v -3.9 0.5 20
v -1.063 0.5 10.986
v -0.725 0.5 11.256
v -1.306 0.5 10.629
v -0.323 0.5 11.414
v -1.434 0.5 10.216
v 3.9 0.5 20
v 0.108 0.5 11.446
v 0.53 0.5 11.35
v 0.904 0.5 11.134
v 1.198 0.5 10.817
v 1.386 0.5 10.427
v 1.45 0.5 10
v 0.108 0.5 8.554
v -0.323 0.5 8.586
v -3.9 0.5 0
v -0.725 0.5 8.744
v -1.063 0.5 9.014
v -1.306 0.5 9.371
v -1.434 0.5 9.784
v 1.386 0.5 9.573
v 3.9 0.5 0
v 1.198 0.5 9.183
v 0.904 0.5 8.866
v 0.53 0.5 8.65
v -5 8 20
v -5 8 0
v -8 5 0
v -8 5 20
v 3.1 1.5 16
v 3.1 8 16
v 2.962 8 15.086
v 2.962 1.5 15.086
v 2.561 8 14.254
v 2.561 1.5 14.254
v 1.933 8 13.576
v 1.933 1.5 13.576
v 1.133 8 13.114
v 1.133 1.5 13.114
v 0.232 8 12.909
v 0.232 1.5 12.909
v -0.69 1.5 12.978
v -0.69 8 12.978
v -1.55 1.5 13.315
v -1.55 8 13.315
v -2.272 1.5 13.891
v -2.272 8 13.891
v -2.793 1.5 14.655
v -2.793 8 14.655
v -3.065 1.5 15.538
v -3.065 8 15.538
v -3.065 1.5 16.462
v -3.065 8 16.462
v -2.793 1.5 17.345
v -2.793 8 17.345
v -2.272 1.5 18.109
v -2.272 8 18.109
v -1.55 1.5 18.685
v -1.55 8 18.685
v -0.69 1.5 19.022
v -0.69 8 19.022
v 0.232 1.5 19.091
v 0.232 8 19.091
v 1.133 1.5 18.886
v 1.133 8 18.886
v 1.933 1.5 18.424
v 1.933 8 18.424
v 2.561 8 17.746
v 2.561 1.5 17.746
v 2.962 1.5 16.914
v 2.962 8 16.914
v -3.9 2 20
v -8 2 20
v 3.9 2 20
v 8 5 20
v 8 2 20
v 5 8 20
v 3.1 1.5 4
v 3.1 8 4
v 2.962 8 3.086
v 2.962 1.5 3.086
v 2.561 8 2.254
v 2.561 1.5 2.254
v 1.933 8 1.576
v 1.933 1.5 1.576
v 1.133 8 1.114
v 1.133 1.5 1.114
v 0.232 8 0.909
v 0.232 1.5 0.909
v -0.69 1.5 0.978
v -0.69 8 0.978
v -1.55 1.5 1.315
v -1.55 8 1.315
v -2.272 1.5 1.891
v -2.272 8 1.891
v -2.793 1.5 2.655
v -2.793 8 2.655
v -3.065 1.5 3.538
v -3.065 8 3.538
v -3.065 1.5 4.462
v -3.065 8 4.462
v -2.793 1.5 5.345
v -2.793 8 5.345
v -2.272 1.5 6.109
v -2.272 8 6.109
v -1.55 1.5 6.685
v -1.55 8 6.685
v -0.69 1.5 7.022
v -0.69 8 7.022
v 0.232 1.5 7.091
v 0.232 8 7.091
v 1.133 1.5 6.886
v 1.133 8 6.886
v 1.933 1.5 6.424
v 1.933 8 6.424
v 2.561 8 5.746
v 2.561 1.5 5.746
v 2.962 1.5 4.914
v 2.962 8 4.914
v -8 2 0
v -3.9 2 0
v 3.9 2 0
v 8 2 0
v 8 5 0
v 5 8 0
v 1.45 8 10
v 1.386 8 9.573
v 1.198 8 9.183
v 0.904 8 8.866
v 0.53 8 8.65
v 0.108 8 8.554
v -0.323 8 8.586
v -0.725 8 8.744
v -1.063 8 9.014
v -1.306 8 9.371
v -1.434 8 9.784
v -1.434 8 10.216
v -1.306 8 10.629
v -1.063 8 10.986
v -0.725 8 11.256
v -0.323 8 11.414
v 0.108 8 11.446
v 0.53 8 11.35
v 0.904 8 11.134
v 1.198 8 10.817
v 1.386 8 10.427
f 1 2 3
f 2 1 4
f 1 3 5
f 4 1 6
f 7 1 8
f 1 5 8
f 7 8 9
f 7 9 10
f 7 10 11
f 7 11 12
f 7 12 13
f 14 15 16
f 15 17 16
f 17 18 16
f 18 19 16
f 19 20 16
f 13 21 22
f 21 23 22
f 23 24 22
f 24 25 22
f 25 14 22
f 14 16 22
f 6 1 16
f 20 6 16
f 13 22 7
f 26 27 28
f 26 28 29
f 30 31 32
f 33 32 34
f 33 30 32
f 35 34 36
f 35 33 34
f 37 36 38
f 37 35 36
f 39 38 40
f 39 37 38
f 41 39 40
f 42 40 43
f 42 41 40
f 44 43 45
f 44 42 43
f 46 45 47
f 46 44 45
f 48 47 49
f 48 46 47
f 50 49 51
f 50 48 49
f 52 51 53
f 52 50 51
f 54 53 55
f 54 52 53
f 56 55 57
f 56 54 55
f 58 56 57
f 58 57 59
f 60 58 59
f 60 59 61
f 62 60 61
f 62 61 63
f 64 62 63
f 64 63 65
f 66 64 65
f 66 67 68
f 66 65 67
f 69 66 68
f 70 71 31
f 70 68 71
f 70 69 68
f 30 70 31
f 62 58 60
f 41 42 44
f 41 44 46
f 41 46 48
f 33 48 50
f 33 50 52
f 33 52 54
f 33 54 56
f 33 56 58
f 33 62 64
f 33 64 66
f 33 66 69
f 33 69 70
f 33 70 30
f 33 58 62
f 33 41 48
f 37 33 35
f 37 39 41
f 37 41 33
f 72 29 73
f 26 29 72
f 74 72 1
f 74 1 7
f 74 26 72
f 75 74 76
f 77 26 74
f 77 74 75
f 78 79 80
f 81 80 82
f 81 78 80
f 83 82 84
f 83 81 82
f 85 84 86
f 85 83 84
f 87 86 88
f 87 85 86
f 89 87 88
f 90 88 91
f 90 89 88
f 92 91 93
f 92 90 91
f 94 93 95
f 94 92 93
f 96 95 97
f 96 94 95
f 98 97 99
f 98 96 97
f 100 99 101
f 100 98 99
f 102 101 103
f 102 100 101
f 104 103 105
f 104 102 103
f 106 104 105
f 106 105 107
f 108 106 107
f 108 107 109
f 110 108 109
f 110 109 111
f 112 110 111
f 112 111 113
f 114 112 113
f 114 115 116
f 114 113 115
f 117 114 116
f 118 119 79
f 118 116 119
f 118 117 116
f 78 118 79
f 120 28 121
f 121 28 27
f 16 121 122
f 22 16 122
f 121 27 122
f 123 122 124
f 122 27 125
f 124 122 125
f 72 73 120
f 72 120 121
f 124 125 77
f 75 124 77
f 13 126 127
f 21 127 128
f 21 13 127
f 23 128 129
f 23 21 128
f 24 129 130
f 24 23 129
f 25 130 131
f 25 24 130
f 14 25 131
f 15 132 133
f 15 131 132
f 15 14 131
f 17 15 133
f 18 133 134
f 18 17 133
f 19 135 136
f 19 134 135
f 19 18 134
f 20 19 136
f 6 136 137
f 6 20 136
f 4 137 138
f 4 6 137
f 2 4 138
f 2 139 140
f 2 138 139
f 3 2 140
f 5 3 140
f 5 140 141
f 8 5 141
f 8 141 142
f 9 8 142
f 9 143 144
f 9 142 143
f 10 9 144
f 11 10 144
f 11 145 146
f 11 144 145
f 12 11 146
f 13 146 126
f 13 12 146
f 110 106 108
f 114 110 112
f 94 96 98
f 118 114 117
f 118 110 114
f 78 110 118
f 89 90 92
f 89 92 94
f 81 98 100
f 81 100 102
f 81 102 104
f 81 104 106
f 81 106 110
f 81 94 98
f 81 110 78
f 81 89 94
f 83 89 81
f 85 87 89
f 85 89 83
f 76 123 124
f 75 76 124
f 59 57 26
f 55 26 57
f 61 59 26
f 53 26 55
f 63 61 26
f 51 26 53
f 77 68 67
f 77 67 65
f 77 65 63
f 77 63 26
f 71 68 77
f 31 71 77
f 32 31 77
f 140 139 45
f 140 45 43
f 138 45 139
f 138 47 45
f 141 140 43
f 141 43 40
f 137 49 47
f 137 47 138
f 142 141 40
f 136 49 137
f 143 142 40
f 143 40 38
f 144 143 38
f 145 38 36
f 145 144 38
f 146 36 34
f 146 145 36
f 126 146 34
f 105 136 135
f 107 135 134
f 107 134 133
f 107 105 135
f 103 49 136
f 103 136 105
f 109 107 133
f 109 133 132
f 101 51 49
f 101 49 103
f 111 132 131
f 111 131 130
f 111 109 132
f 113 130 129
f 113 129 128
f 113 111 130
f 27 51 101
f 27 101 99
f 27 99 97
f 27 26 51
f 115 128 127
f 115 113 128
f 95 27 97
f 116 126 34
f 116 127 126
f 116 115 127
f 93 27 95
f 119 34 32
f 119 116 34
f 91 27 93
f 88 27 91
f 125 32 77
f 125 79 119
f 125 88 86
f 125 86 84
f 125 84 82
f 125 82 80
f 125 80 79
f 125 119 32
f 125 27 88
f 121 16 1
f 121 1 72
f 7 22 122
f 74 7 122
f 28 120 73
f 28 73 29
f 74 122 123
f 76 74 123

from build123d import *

# Parameters (mm, degrees)
CYLINDER016017_R            = 1.45
CYLINDER016017_DEPTH        = 10
CYLINDER016015_R            = 3.1
CYLINDER016015_DEPTH        = 10
CYLINDER016016_R            = 3.1
CYLINDER016016_DEPTH        = 10
BOX021_W                    = 7.8
BOX021_H                    = 7.5
BOX021_DEPTH                = 20
BOX022_W                    = 16
BOX022_H                    = 6
BOX022_DEPTH                = 20
CHAMFER016016008004002_SIZE = 3


with BuildPart() as cylinder033:
    # Cylinder016017 → Cylinder016017 (new body)
    with BuildSketch(Plane(origin=(0, 0.5, 10), x_dir=(1, 0, 0), z_dir=(0, 1, 0))):
        Circle(CYLINDER016017_R)
    extrude(amount=CYLINDER016017_DEPTH)


with BuildPart() as cylinder031:
    # Cylinder016015 → Cylinder016015 (new body)
    with BuildSketch(Plane(origin=(0, 0.5, 4), x_dir=(1, 0, 0), z_dir=(0, 1, 0))):
        Circle(CYLINDER016015_R)
    extrude(amount=CYLINDER016015_DEPTH)


with BuildPart() as fusion018004:
    # Cylinder016016 → Cylinder016016 (new body)
    with BuildSketch(Plane(origin=(0, 0.5, 16), x_dir=(1, 0, 0), z_dir=(0, 1, 0))):
        Circle(CYLINDER016016_R)
    extrude(amount=CYLINDER016016_DEPTH)

    # Fusion018004: union Cylinder031
    add(cylinder031.part)


with BuildPart() as fusion018004_1:
    # Fusion018004 placement: moved
    add(fusion018004.part.moved(Location((0, 1, 0))))


with BuildPart() as cube021:
    # Box021 → Box021 (new body)
    with BuildSketch(Plane(origin=(-3.9, 0.5, 0), x_dir=(1, 0, 0), z_dir=(0, 0, 1))):
        with Locations((3.9, 3.75)):
            Rectangle(BOX021_W, BOX021_H)
    extrude(amount=BOX021_DEPTH)


with BuildPart() as magnet_nut:
    # Box022 → Box022 (new body)
    with BuildSketch(Plane(origin=(-8, 2, 0), x_dir=(1, 0, 0), z_dir=(0, 0, 1))):
        with Locations((8, 3)):
            Rectangle(BOX022_W, BOX022_H)
    extrude(amount=BOX022_DEPTH)

    # Chamfer016016008004002
    chamfer016016008004002_edges = [magnet_nut.edges().sort_by_distance(p)[0] for p in [
        (-8, 8, 10),
        (8, 8, 10),
    ]]
    chamfer(chamfer016016008004002_edges, length=CHAMFER016016008004002_SIZE)

    # Fusion018005: union Cube021
    add(cube021.part)

    # Cut010011008008: cut Fusion018004
    add(fusion018004_1.part, mode=Mode.SUBTRACT)

    # Cut010011008009: cut Cylinder033
    add(cylinder033.part, mode=Mode.SUBTRACT)


solid = magnet_nut.part
